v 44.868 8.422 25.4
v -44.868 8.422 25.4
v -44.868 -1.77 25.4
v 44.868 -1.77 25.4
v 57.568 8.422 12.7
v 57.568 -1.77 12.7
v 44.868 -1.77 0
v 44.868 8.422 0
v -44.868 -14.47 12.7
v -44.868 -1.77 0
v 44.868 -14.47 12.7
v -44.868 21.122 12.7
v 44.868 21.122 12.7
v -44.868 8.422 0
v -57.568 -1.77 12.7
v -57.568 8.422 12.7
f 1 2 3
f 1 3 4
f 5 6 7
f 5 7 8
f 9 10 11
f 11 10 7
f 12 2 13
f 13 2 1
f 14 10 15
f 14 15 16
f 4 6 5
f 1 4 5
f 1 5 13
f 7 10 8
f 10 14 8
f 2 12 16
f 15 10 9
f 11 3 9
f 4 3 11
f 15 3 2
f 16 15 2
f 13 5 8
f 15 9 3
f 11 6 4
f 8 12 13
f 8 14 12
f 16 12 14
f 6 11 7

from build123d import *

# Parameters (mm, degrees)
F0_W     = 115.1367947459
F0_H     = 35.5919650756
F1_DEPTH = 25.4
F2_SIZE  = 12.69999


# Not quite as in the source:
# - a fillet or chamfer is up to 0.001 mm smaller than in the source, because OpenCascade refuses the exact size


with BuildPart() as f1:
    # F0 (on Top) → F1 (new body)
    with BuildSketch(Plane.XY):
        with Locations((0, 3.3258602489)):
            Rectangle(F0_W, F0_H)
    extrude(amount=F1_DEPTH)

    # F2 (size 12.7 in the source; OpenCascade refuses exactly that, so slightly less here)
    f2_edges = [f1.edges().sort_by_distance(p)[0] for p in [
        (0, -14.470122, 0),
        (57.568397, 21.121843, 12.7),
        (57.568397, -14.470122, 12.7),
        (57.568397, 3.32586, 0),
        (57.568397, 3.32586, 25.4),
        (0, 21.121843, 25.4),
        (0, 21.121843, 0),
        (-57.568397, 21.121843, 12.7),
        (0, -14.470122, 25.4),
        (-57.568397, 3.32586, 0),
        (-57.568397, -14.470122, 12.7),
        (-57.568397, 3.32586, 25.4),
    ]]
    chamfer(f2_edges, length=F2_SIZE)


solid = f1.part
